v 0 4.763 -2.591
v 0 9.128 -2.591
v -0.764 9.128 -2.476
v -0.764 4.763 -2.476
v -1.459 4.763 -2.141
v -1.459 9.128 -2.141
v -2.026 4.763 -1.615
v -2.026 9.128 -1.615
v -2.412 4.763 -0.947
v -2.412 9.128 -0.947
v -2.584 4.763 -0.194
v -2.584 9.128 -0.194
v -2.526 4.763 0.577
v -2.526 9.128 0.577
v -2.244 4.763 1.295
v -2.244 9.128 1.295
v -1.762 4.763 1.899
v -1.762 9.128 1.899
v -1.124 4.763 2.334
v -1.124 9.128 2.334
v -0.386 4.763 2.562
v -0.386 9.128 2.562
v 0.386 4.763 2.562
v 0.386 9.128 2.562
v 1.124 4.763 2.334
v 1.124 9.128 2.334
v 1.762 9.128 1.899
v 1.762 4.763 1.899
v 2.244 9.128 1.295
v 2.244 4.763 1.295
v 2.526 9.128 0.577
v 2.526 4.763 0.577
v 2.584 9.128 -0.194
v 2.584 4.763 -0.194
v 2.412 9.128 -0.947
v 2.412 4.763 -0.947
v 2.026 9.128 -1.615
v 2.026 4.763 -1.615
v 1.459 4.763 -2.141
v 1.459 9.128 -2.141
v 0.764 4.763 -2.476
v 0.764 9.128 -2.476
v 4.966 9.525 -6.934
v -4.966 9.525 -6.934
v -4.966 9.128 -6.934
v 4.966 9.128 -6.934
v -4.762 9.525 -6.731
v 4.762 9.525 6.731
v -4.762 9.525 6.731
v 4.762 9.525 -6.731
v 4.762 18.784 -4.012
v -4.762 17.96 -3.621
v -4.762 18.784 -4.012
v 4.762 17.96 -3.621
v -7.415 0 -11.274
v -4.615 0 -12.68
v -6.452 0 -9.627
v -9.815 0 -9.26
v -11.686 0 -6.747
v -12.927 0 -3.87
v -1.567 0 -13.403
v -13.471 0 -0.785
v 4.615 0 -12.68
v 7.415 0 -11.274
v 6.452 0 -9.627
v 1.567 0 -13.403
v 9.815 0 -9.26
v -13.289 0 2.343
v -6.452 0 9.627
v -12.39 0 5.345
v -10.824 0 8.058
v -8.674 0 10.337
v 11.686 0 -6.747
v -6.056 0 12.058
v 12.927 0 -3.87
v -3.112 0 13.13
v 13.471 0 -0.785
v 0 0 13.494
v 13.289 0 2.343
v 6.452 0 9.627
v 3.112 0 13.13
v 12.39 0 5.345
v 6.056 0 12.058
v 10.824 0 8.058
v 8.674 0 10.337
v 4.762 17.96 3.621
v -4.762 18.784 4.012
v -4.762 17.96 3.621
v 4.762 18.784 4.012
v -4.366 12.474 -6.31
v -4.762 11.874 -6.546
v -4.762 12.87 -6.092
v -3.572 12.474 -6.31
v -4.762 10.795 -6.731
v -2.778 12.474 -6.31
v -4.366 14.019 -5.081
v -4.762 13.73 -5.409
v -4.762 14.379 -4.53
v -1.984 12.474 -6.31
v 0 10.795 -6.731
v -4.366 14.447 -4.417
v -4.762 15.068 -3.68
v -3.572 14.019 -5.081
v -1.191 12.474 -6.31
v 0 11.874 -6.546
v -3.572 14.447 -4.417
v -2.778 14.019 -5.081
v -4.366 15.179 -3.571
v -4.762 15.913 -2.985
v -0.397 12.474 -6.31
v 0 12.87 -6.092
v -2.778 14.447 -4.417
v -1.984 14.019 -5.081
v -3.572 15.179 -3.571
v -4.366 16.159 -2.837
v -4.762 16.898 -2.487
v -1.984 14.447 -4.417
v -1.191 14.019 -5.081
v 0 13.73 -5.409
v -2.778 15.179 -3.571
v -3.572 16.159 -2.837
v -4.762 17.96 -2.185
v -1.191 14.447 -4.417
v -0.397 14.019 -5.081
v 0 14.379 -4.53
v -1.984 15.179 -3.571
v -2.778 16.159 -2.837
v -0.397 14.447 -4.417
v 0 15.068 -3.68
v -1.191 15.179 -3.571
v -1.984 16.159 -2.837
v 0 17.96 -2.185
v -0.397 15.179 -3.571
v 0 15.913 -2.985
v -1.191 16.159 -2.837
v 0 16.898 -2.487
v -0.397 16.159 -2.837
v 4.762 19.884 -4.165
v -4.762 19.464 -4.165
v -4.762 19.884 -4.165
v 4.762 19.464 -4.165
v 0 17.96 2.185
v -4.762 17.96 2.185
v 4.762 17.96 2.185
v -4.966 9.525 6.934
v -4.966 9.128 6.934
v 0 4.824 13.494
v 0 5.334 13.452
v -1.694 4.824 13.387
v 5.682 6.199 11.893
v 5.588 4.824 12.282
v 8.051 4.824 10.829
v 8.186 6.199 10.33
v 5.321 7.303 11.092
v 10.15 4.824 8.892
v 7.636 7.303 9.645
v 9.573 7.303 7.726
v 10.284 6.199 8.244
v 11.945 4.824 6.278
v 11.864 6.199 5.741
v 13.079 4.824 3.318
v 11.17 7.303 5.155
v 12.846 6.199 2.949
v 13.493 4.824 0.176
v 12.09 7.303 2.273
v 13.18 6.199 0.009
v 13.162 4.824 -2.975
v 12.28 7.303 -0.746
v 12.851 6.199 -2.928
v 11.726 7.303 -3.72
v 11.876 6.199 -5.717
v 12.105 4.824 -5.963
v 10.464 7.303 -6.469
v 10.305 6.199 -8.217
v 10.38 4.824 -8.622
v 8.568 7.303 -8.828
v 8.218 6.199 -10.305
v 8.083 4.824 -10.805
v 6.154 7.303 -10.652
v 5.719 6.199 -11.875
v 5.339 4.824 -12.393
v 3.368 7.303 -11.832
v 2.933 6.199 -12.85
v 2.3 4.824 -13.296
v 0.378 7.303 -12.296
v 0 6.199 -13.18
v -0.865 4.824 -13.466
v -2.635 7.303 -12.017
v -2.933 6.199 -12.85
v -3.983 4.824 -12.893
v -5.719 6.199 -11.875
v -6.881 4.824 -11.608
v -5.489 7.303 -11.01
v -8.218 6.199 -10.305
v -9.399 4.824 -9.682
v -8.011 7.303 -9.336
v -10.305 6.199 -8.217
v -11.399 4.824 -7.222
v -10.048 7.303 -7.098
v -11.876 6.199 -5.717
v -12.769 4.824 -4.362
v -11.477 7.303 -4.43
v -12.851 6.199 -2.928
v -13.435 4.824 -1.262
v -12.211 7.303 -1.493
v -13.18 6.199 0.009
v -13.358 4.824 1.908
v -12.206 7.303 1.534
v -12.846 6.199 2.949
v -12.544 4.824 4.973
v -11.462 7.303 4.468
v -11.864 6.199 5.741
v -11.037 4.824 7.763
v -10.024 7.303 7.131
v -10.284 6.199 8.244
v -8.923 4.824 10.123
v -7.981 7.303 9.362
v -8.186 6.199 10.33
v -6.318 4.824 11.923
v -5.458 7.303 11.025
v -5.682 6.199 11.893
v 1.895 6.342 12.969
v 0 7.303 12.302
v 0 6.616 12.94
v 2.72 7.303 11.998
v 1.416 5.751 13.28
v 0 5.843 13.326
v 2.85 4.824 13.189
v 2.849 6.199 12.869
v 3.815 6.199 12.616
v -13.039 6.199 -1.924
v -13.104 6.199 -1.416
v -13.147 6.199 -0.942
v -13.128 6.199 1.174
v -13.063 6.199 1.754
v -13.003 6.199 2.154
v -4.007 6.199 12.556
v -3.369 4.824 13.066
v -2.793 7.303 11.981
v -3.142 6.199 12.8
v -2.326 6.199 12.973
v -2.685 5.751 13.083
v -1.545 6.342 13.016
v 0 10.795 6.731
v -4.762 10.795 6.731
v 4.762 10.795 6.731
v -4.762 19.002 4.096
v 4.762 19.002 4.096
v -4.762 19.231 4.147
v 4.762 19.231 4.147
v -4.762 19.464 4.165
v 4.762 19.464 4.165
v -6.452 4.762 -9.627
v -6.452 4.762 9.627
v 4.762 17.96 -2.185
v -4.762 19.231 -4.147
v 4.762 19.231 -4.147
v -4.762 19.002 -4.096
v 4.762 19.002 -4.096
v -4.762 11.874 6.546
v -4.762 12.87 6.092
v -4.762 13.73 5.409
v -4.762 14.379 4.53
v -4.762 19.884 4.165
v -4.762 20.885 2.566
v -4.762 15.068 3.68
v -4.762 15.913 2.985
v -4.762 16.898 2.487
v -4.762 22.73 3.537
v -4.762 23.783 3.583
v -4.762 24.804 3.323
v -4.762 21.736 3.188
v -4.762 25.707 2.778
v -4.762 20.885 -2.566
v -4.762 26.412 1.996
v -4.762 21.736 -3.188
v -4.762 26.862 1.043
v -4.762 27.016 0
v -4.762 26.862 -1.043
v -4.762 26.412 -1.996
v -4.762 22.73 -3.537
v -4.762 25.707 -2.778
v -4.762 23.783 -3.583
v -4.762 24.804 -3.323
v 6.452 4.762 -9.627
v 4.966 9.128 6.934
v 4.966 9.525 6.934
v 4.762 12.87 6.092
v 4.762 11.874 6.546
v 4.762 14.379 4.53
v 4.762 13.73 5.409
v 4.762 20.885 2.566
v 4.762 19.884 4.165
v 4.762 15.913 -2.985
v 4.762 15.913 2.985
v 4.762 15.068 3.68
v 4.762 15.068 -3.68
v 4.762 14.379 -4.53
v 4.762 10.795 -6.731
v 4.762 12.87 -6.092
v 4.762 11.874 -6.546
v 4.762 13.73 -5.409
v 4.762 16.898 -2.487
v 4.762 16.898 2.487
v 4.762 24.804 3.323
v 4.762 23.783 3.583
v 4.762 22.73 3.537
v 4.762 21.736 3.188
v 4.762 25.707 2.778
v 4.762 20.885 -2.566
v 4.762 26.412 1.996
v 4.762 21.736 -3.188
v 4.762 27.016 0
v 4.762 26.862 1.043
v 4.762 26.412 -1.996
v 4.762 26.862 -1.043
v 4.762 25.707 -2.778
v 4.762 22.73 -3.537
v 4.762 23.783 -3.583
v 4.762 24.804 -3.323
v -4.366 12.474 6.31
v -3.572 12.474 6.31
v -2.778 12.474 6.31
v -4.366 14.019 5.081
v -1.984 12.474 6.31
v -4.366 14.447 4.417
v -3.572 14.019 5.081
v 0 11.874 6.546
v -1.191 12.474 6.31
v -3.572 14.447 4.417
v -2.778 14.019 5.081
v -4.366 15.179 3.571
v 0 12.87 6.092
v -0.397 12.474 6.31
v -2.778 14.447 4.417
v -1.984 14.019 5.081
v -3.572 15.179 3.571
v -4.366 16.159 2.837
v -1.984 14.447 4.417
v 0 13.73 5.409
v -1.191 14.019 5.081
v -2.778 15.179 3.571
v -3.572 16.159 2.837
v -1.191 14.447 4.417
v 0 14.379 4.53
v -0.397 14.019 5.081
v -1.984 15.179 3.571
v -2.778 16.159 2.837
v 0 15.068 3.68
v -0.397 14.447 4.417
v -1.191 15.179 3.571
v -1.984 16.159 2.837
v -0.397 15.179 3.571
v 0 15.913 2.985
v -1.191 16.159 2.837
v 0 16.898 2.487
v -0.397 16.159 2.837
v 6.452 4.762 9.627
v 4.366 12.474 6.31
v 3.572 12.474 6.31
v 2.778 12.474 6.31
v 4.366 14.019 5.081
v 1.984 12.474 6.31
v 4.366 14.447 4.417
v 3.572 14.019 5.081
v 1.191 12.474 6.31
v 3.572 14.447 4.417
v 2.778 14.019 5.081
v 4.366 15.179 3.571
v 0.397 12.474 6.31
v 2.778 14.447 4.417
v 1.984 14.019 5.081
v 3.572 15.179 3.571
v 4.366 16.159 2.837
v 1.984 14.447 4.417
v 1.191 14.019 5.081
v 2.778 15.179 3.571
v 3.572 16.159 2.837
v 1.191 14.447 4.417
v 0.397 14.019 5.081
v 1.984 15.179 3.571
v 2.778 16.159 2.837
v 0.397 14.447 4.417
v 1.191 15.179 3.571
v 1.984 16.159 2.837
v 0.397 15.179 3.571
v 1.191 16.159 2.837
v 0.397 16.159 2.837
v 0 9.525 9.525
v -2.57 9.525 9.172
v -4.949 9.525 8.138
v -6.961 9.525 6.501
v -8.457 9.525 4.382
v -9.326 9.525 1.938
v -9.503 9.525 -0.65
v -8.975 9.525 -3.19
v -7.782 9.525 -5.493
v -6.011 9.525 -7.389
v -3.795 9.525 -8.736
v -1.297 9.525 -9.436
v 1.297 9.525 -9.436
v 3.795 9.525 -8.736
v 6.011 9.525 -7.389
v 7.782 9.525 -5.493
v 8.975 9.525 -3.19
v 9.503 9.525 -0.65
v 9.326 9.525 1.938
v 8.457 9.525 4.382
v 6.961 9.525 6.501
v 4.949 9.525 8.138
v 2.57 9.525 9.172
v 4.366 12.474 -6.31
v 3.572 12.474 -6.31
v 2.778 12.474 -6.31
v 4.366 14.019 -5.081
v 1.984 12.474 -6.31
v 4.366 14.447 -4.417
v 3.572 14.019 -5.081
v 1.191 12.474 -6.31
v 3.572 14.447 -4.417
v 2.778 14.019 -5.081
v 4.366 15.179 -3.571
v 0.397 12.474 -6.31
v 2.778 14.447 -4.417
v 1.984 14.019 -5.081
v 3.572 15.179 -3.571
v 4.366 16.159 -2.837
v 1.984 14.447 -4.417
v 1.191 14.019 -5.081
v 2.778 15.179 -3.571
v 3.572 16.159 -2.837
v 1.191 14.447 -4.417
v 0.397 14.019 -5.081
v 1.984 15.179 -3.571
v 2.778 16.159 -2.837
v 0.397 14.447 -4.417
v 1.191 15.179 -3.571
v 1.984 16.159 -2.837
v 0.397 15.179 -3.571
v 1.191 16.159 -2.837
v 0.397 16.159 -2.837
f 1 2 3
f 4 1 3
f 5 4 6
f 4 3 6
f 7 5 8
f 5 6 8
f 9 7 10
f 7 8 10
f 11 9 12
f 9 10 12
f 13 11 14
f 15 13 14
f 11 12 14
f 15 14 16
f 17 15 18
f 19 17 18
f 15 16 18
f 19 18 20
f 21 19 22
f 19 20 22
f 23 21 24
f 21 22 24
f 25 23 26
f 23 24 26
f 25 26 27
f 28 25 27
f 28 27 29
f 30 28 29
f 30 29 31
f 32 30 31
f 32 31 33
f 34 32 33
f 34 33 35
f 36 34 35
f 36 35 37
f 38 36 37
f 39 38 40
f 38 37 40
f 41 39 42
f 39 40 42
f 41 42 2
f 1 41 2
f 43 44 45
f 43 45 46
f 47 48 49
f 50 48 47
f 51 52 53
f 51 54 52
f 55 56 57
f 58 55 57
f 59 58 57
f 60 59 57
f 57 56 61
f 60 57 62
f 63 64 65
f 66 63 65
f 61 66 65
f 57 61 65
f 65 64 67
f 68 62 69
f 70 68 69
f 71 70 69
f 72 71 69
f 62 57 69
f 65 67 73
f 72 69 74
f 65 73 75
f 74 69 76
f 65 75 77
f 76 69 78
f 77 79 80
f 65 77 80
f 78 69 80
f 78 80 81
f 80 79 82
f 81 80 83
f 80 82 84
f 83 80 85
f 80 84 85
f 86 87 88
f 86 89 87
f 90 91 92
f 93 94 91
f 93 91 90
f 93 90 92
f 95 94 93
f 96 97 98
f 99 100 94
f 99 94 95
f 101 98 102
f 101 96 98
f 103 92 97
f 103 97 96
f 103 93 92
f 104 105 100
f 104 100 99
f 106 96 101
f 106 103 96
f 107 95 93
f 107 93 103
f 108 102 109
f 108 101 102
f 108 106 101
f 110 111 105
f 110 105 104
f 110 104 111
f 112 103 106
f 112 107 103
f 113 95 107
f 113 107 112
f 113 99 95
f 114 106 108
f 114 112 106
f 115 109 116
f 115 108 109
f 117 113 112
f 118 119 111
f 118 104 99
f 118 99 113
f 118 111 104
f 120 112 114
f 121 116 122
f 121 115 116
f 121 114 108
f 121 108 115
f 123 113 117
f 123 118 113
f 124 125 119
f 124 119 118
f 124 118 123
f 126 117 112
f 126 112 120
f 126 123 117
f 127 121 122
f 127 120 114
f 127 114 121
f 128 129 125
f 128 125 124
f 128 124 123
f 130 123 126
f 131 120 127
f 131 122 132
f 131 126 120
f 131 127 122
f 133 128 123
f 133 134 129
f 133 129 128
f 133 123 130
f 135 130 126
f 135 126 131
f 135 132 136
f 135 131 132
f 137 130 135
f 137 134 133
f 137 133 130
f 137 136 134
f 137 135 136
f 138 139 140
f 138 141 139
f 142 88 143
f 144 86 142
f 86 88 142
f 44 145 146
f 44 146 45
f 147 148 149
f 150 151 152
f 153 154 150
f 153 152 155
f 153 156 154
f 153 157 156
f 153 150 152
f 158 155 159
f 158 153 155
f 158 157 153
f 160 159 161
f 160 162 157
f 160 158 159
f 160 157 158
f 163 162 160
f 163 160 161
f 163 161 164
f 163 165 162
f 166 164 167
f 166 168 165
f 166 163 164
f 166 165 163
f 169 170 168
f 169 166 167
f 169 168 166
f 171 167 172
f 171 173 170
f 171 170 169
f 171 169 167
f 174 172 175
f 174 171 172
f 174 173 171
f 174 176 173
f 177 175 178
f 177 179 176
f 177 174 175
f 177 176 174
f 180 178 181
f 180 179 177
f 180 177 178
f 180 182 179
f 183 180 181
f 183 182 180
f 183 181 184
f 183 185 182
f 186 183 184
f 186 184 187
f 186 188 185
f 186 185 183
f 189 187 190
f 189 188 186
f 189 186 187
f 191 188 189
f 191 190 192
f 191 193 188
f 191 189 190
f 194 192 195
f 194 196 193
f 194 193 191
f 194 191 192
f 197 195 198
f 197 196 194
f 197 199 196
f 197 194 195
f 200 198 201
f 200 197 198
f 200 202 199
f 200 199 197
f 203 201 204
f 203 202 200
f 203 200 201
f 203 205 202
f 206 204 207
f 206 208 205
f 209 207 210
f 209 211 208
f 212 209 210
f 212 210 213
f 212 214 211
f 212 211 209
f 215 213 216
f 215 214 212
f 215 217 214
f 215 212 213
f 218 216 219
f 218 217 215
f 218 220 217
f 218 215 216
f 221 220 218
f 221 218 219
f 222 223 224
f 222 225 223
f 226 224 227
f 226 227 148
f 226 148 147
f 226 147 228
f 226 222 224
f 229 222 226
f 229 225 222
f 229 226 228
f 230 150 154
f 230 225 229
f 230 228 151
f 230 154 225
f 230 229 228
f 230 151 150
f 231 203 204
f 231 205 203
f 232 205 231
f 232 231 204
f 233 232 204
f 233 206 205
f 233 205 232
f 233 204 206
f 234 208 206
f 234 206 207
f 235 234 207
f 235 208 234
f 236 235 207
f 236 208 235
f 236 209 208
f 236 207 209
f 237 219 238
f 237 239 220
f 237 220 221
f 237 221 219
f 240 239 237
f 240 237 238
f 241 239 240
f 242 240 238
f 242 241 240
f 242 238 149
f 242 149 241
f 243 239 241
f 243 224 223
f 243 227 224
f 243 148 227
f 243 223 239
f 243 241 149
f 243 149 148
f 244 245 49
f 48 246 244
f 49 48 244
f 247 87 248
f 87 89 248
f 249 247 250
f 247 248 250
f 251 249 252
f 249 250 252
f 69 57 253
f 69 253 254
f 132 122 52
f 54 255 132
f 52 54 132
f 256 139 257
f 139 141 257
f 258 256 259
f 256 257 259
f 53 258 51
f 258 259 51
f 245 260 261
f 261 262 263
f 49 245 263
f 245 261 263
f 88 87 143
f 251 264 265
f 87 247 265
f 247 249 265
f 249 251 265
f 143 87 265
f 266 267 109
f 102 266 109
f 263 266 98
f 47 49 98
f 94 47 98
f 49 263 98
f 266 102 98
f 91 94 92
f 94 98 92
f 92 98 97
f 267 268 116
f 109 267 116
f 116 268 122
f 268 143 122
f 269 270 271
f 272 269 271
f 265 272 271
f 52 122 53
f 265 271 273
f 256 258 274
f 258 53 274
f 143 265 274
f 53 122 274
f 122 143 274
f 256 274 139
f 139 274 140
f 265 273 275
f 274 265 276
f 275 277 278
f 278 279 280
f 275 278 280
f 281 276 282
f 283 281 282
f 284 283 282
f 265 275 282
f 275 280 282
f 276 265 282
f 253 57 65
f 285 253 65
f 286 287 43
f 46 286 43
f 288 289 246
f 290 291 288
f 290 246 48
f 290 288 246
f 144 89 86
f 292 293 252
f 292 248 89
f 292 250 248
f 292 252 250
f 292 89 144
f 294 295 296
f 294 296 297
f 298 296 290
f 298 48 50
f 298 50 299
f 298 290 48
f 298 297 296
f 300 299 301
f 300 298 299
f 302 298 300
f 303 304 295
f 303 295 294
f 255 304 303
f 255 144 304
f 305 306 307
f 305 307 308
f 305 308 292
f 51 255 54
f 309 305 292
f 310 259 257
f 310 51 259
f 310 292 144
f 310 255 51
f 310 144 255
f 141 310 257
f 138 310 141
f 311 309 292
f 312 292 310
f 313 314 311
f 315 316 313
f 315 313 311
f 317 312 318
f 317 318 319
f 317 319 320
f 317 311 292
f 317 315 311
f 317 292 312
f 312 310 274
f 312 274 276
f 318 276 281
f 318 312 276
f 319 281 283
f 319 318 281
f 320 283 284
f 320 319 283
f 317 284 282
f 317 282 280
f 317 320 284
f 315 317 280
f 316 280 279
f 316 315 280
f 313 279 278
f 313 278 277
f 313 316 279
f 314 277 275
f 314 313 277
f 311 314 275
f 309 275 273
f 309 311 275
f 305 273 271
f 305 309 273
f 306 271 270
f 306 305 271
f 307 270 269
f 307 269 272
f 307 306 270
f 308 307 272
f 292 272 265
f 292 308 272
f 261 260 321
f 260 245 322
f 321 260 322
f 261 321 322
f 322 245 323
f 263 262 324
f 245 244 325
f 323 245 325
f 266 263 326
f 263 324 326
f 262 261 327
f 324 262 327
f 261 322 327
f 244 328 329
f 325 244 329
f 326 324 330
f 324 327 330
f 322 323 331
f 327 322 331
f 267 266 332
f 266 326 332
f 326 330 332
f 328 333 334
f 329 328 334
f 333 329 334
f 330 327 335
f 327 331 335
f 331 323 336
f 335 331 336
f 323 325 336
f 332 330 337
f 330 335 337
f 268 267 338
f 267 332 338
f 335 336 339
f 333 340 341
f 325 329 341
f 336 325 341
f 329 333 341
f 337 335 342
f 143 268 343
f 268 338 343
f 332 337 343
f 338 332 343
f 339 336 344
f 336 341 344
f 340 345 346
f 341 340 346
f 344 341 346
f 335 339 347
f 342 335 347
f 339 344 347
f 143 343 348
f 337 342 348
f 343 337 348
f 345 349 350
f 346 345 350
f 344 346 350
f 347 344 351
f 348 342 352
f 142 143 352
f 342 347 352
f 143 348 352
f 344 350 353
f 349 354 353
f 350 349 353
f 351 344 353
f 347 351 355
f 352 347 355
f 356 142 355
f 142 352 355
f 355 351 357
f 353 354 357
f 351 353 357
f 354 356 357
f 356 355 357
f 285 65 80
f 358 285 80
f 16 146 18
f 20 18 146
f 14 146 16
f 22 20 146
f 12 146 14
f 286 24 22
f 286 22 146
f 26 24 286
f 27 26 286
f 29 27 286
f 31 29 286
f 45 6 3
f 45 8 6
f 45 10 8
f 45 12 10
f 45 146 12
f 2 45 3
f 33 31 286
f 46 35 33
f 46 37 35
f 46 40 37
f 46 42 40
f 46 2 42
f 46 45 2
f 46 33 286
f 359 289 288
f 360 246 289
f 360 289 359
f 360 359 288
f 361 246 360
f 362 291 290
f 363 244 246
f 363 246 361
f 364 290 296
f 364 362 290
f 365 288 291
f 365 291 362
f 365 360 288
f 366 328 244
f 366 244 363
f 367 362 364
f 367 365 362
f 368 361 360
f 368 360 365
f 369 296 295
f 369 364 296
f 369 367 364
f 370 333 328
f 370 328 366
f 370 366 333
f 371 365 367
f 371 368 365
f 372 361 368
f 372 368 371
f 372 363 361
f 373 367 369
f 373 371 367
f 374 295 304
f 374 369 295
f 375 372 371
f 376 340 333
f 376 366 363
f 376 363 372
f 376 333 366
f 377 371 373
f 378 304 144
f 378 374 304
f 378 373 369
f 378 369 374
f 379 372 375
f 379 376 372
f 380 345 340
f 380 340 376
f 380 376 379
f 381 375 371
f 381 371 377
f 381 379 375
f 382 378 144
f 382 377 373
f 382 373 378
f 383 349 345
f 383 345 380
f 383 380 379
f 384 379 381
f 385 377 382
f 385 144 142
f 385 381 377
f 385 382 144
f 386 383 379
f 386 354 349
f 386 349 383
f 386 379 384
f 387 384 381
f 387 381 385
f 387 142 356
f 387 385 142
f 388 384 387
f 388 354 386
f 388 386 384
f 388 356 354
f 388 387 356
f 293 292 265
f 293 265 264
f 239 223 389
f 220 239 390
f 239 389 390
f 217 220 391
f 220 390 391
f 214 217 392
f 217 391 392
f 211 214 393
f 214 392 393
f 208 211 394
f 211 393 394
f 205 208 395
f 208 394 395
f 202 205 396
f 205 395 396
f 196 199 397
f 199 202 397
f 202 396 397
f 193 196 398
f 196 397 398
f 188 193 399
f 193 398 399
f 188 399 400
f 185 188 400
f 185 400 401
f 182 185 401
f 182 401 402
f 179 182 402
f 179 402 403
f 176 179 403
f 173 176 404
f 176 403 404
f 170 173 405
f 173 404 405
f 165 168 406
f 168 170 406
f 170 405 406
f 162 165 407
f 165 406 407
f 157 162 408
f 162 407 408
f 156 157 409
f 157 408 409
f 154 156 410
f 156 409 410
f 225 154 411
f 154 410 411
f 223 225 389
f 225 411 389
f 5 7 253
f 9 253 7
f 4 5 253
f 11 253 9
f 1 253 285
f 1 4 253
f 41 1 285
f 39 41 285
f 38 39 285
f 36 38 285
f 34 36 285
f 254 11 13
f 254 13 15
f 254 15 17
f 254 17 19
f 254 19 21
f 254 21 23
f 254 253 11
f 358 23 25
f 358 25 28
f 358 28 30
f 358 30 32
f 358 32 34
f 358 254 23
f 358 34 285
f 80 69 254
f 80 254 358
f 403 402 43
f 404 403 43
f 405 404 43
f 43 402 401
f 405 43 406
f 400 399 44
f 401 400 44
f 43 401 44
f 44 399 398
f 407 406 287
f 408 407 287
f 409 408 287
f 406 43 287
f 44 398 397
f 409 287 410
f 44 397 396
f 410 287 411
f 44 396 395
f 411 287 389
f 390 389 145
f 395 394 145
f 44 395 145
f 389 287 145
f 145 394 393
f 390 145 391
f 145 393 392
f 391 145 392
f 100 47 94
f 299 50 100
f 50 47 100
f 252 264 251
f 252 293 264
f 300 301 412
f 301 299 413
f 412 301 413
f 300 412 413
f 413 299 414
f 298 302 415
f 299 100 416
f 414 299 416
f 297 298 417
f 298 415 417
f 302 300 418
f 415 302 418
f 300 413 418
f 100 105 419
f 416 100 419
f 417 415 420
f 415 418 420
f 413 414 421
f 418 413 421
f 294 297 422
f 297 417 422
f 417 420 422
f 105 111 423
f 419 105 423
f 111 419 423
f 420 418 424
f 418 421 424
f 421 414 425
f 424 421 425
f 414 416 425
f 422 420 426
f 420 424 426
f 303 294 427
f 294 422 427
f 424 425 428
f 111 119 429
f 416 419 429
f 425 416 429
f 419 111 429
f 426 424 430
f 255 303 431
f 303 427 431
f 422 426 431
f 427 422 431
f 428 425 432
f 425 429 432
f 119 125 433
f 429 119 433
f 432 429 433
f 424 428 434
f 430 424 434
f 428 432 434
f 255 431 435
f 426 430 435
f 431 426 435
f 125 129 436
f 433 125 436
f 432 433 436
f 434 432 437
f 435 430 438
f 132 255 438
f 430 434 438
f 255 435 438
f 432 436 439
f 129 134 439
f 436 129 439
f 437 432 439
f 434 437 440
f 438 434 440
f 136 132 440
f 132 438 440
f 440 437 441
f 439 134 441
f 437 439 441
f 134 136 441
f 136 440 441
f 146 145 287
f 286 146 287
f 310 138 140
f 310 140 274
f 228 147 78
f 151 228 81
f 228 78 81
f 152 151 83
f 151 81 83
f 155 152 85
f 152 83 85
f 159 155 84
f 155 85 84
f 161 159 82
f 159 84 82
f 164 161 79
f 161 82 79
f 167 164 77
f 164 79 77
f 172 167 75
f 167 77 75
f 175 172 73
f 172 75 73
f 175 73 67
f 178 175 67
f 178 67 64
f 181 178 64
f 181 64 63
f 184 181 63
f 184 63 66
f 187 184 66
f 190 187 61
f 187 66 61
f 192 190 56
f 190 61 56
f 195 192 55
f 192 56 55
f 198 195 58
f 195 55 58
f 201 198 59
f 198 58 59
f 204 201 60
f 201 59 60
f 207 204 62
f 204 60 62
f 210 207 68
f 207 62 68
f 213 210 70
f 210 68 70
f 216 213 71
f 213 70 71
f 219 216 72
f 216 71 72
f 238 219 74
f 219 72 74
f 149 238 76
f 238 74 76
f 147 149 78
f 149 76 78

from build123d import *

# Parameters (mm, degrees)
SKETCH1_R           = 13.49375
BOSS_EXTRUDE1_DEPTH = 6.35
SKETCH2_W           = 12.9032
SKETCH2_H           = 19.2532
CUT_EXTRUDE1_DEPTH  = 4.7625
FILLET1_R           = 3.175
BOSS_EXTRUDE2_DEPTH = 4.7625
FILLET3_R           = 1.5875
SKETCH6_W           = 9.9314
SKETCH6_H           = 13.8684
CUT_EXTRUDE2_DEPTH  = 0.396875
SKETCH9_W           = 2.5908
SKETCH9_H           = 22.253441323


with BuildPart() as part:
    # Sketch1 → Boss-Extrude1 (new body)
    with BuildSketch(Plane(origin=(0, 0, 0), x_dir=(1, 0, 0), z_dir=(0, 1, 0))):
        with Locations(Location((0, 0, 0), (0, 0, 270))):
            Circle(SKETCH1_R)
    extrude(amount=BOSS_EXTRUDE1_DEPTH)

    # Sketch2 → Cut-Extrude1 (cut)
    with BuildSketch(Plane.XZ):
        Rectangle(SKETCH2_W, SKETCH2_H)
    extrude(amount=-CUT_EXTRUDE1_DEPTH, mode=Mode.SUBTRACT)

    # Sketch4 → Revolve1 (revolve)
    with BuildSketch(Plane.XY, mode=Mode.PRIVATE) as revolve1_sk:
        Polygon((-13.49375, 6.35), (-9.525, 9.525), (0, 9.525), (0, 6.35), align=None)
    revolve(revolve1_sk.sketch.rotate(Axis((0, 9.525, 0), (0, -1, 0)), 270), axis=Axis((0, 9.525, 0), (0, -1, 0)))

    # Fillet1
    fillet1_edges = [part.edges().sort_by_distance(p)[0] for p in [
        (0, 6.35, -13.49375),
    ]]
    fillet(fillet1_edges, radius=FILLET1_R)

    # Sketch6 → Cut-Extrude2 (cut)
    with BuildSketch(Plane(origin=(0, 9.525, 0), x_dir=(1, 0, 0), z_dir=(0, 1, 0))):
        Rectangle(SKETCH6_W, SKETCH6_H)
    extrude(amount=-CUT_EXTRUDE2_DEPTH, mode=Mode.SUBTRACT)

    # Sketch9 → #6 (0.204) Diameter Hole1 (revolve, cut)
    with BuildSketch(Plane(origin=(0, 4.7625, 0), x_dir=(0, 0, -1), z_dir=(1, 0, 0))):
        with Locations((1.2954, 11.126720662)):
            Rectangle(SKETCH9_W, SKETCH9_H)
    revolve(axis=Axis((0, -1.5875, 0), (0, 1, 0)), mode=Mode.SUBTRACT)


with BuildPart() as body_2:
    # Sketch5 → Boss-Extrude2 (new, symmetric)
    with BuildSketch(Plane(origin=(0, 0, 0), x_dir=(0, 0, -1), z_dir=(1, 0, 0))):
        with BuildLine():
            Line((-6.731, 9.525), (6.731, 9.525))
            Line((6.731, 9.525), (6.731, 10.795))
            add(Edge.make_bspline(
                [(6.731, 10.795), (6.731, 11.024131927), (6.649606127, 11.602687461), (6.358131175, 12.470647258), (5.808408605, 13.330145179), (5.232553241, 13.930163377), (4.735621925, 14.267193507), (4.365875944, 14.466973106), (3.991208167, 14.763542309), (3.585608323, 15.152405246), (3.167726873, 15.621045959), (2.83552458, 16.138033377), (2.44918748, 16.909764468), (2.273183873, 17.531735358), (2.185216272, 17.959882493)],
                knots=[0, 0, 0, 0, 0.07817942, 0.198071141, 0.30964197, 0.424067637, 0.479109808, 0.514035466, 0.567359704, 0.641472425, 0.705863071, 0.781200872, 0.85049795, 1, 1, 1, 1], degree=3))
            Line((2.185216272, 17.959882493), (3.620759547, 17.959882493))
            Line((3.620759547, 17.959882493), (4.164758741, 19.106873992))
            Line((4.164758741, 19.106873992), (4.164758741, 19.884034181))
            Line((4.164758741, 19.884034181), (2.565705919, 20.885069842))
            ThreePointArc((2.565705919, 20.885069842), (0, 27.015941323), (-2.565705919, 20.885069842))
            Line((-2.565705919, 20.885069842), (-4.164758741, 19.884034181))
            Line((-4.164758741, 19.884034181), (-4.164758741, 19.106873992))
            Line((-4.164758741, 19.106873992), (-3.620759547, 17.959882493))
            Line((-3.620759547, 17.959882493), (-2.185216272, 17.959882493))
            add(Edge.make_bspline(
                [(-6.731, 10.795), (-6.731, 11.024131927), (-6.649606127, 11.602687461), (-6.358131175, 12.470647258), (-5.808408605, 13.330145179), (-5.232553241, 13.930163377), (-4.735621925, 14.267193507), (-4.365875944, 14.466973106), (-3.991208167, 14.763542309), (-3.585608323, 15.152405246), (-3.167726873, 15.621045959), (-2.83552458, 16.138033377), (-2.44918748, 16.909764468), (-2.273183873, 17.531735358), (-2.185216272, 17.959882493)],
                knots=[0, 0, 0, 0, 0.07817942, 0.198071141, 0.30964197, 0.424067637, 0.479109808, 0.514035466, 0.567359704, 0.641472425, 0.705863071, 0.781200872, 0.85049795, 1, 1, 1, 1], degree=3))
            Line((-6.731, 10.795), (-6.731, 9.525))
        make_face()
    extrude(amount=BOSS_EXTRUDE2_DEPTH, both=True)

    # Fillet3
    fillet3_edges = [body_2.edges().sort_by_distance(p)[0] for p in [
        (0, 19.106873992, 4.164758741),
        (0, 19.106873992, -4.164758741),
    ]]
    fillet(fillet3_edges, radius=FILLET3_R)


solid = Compound([part.part, body_2.part])
